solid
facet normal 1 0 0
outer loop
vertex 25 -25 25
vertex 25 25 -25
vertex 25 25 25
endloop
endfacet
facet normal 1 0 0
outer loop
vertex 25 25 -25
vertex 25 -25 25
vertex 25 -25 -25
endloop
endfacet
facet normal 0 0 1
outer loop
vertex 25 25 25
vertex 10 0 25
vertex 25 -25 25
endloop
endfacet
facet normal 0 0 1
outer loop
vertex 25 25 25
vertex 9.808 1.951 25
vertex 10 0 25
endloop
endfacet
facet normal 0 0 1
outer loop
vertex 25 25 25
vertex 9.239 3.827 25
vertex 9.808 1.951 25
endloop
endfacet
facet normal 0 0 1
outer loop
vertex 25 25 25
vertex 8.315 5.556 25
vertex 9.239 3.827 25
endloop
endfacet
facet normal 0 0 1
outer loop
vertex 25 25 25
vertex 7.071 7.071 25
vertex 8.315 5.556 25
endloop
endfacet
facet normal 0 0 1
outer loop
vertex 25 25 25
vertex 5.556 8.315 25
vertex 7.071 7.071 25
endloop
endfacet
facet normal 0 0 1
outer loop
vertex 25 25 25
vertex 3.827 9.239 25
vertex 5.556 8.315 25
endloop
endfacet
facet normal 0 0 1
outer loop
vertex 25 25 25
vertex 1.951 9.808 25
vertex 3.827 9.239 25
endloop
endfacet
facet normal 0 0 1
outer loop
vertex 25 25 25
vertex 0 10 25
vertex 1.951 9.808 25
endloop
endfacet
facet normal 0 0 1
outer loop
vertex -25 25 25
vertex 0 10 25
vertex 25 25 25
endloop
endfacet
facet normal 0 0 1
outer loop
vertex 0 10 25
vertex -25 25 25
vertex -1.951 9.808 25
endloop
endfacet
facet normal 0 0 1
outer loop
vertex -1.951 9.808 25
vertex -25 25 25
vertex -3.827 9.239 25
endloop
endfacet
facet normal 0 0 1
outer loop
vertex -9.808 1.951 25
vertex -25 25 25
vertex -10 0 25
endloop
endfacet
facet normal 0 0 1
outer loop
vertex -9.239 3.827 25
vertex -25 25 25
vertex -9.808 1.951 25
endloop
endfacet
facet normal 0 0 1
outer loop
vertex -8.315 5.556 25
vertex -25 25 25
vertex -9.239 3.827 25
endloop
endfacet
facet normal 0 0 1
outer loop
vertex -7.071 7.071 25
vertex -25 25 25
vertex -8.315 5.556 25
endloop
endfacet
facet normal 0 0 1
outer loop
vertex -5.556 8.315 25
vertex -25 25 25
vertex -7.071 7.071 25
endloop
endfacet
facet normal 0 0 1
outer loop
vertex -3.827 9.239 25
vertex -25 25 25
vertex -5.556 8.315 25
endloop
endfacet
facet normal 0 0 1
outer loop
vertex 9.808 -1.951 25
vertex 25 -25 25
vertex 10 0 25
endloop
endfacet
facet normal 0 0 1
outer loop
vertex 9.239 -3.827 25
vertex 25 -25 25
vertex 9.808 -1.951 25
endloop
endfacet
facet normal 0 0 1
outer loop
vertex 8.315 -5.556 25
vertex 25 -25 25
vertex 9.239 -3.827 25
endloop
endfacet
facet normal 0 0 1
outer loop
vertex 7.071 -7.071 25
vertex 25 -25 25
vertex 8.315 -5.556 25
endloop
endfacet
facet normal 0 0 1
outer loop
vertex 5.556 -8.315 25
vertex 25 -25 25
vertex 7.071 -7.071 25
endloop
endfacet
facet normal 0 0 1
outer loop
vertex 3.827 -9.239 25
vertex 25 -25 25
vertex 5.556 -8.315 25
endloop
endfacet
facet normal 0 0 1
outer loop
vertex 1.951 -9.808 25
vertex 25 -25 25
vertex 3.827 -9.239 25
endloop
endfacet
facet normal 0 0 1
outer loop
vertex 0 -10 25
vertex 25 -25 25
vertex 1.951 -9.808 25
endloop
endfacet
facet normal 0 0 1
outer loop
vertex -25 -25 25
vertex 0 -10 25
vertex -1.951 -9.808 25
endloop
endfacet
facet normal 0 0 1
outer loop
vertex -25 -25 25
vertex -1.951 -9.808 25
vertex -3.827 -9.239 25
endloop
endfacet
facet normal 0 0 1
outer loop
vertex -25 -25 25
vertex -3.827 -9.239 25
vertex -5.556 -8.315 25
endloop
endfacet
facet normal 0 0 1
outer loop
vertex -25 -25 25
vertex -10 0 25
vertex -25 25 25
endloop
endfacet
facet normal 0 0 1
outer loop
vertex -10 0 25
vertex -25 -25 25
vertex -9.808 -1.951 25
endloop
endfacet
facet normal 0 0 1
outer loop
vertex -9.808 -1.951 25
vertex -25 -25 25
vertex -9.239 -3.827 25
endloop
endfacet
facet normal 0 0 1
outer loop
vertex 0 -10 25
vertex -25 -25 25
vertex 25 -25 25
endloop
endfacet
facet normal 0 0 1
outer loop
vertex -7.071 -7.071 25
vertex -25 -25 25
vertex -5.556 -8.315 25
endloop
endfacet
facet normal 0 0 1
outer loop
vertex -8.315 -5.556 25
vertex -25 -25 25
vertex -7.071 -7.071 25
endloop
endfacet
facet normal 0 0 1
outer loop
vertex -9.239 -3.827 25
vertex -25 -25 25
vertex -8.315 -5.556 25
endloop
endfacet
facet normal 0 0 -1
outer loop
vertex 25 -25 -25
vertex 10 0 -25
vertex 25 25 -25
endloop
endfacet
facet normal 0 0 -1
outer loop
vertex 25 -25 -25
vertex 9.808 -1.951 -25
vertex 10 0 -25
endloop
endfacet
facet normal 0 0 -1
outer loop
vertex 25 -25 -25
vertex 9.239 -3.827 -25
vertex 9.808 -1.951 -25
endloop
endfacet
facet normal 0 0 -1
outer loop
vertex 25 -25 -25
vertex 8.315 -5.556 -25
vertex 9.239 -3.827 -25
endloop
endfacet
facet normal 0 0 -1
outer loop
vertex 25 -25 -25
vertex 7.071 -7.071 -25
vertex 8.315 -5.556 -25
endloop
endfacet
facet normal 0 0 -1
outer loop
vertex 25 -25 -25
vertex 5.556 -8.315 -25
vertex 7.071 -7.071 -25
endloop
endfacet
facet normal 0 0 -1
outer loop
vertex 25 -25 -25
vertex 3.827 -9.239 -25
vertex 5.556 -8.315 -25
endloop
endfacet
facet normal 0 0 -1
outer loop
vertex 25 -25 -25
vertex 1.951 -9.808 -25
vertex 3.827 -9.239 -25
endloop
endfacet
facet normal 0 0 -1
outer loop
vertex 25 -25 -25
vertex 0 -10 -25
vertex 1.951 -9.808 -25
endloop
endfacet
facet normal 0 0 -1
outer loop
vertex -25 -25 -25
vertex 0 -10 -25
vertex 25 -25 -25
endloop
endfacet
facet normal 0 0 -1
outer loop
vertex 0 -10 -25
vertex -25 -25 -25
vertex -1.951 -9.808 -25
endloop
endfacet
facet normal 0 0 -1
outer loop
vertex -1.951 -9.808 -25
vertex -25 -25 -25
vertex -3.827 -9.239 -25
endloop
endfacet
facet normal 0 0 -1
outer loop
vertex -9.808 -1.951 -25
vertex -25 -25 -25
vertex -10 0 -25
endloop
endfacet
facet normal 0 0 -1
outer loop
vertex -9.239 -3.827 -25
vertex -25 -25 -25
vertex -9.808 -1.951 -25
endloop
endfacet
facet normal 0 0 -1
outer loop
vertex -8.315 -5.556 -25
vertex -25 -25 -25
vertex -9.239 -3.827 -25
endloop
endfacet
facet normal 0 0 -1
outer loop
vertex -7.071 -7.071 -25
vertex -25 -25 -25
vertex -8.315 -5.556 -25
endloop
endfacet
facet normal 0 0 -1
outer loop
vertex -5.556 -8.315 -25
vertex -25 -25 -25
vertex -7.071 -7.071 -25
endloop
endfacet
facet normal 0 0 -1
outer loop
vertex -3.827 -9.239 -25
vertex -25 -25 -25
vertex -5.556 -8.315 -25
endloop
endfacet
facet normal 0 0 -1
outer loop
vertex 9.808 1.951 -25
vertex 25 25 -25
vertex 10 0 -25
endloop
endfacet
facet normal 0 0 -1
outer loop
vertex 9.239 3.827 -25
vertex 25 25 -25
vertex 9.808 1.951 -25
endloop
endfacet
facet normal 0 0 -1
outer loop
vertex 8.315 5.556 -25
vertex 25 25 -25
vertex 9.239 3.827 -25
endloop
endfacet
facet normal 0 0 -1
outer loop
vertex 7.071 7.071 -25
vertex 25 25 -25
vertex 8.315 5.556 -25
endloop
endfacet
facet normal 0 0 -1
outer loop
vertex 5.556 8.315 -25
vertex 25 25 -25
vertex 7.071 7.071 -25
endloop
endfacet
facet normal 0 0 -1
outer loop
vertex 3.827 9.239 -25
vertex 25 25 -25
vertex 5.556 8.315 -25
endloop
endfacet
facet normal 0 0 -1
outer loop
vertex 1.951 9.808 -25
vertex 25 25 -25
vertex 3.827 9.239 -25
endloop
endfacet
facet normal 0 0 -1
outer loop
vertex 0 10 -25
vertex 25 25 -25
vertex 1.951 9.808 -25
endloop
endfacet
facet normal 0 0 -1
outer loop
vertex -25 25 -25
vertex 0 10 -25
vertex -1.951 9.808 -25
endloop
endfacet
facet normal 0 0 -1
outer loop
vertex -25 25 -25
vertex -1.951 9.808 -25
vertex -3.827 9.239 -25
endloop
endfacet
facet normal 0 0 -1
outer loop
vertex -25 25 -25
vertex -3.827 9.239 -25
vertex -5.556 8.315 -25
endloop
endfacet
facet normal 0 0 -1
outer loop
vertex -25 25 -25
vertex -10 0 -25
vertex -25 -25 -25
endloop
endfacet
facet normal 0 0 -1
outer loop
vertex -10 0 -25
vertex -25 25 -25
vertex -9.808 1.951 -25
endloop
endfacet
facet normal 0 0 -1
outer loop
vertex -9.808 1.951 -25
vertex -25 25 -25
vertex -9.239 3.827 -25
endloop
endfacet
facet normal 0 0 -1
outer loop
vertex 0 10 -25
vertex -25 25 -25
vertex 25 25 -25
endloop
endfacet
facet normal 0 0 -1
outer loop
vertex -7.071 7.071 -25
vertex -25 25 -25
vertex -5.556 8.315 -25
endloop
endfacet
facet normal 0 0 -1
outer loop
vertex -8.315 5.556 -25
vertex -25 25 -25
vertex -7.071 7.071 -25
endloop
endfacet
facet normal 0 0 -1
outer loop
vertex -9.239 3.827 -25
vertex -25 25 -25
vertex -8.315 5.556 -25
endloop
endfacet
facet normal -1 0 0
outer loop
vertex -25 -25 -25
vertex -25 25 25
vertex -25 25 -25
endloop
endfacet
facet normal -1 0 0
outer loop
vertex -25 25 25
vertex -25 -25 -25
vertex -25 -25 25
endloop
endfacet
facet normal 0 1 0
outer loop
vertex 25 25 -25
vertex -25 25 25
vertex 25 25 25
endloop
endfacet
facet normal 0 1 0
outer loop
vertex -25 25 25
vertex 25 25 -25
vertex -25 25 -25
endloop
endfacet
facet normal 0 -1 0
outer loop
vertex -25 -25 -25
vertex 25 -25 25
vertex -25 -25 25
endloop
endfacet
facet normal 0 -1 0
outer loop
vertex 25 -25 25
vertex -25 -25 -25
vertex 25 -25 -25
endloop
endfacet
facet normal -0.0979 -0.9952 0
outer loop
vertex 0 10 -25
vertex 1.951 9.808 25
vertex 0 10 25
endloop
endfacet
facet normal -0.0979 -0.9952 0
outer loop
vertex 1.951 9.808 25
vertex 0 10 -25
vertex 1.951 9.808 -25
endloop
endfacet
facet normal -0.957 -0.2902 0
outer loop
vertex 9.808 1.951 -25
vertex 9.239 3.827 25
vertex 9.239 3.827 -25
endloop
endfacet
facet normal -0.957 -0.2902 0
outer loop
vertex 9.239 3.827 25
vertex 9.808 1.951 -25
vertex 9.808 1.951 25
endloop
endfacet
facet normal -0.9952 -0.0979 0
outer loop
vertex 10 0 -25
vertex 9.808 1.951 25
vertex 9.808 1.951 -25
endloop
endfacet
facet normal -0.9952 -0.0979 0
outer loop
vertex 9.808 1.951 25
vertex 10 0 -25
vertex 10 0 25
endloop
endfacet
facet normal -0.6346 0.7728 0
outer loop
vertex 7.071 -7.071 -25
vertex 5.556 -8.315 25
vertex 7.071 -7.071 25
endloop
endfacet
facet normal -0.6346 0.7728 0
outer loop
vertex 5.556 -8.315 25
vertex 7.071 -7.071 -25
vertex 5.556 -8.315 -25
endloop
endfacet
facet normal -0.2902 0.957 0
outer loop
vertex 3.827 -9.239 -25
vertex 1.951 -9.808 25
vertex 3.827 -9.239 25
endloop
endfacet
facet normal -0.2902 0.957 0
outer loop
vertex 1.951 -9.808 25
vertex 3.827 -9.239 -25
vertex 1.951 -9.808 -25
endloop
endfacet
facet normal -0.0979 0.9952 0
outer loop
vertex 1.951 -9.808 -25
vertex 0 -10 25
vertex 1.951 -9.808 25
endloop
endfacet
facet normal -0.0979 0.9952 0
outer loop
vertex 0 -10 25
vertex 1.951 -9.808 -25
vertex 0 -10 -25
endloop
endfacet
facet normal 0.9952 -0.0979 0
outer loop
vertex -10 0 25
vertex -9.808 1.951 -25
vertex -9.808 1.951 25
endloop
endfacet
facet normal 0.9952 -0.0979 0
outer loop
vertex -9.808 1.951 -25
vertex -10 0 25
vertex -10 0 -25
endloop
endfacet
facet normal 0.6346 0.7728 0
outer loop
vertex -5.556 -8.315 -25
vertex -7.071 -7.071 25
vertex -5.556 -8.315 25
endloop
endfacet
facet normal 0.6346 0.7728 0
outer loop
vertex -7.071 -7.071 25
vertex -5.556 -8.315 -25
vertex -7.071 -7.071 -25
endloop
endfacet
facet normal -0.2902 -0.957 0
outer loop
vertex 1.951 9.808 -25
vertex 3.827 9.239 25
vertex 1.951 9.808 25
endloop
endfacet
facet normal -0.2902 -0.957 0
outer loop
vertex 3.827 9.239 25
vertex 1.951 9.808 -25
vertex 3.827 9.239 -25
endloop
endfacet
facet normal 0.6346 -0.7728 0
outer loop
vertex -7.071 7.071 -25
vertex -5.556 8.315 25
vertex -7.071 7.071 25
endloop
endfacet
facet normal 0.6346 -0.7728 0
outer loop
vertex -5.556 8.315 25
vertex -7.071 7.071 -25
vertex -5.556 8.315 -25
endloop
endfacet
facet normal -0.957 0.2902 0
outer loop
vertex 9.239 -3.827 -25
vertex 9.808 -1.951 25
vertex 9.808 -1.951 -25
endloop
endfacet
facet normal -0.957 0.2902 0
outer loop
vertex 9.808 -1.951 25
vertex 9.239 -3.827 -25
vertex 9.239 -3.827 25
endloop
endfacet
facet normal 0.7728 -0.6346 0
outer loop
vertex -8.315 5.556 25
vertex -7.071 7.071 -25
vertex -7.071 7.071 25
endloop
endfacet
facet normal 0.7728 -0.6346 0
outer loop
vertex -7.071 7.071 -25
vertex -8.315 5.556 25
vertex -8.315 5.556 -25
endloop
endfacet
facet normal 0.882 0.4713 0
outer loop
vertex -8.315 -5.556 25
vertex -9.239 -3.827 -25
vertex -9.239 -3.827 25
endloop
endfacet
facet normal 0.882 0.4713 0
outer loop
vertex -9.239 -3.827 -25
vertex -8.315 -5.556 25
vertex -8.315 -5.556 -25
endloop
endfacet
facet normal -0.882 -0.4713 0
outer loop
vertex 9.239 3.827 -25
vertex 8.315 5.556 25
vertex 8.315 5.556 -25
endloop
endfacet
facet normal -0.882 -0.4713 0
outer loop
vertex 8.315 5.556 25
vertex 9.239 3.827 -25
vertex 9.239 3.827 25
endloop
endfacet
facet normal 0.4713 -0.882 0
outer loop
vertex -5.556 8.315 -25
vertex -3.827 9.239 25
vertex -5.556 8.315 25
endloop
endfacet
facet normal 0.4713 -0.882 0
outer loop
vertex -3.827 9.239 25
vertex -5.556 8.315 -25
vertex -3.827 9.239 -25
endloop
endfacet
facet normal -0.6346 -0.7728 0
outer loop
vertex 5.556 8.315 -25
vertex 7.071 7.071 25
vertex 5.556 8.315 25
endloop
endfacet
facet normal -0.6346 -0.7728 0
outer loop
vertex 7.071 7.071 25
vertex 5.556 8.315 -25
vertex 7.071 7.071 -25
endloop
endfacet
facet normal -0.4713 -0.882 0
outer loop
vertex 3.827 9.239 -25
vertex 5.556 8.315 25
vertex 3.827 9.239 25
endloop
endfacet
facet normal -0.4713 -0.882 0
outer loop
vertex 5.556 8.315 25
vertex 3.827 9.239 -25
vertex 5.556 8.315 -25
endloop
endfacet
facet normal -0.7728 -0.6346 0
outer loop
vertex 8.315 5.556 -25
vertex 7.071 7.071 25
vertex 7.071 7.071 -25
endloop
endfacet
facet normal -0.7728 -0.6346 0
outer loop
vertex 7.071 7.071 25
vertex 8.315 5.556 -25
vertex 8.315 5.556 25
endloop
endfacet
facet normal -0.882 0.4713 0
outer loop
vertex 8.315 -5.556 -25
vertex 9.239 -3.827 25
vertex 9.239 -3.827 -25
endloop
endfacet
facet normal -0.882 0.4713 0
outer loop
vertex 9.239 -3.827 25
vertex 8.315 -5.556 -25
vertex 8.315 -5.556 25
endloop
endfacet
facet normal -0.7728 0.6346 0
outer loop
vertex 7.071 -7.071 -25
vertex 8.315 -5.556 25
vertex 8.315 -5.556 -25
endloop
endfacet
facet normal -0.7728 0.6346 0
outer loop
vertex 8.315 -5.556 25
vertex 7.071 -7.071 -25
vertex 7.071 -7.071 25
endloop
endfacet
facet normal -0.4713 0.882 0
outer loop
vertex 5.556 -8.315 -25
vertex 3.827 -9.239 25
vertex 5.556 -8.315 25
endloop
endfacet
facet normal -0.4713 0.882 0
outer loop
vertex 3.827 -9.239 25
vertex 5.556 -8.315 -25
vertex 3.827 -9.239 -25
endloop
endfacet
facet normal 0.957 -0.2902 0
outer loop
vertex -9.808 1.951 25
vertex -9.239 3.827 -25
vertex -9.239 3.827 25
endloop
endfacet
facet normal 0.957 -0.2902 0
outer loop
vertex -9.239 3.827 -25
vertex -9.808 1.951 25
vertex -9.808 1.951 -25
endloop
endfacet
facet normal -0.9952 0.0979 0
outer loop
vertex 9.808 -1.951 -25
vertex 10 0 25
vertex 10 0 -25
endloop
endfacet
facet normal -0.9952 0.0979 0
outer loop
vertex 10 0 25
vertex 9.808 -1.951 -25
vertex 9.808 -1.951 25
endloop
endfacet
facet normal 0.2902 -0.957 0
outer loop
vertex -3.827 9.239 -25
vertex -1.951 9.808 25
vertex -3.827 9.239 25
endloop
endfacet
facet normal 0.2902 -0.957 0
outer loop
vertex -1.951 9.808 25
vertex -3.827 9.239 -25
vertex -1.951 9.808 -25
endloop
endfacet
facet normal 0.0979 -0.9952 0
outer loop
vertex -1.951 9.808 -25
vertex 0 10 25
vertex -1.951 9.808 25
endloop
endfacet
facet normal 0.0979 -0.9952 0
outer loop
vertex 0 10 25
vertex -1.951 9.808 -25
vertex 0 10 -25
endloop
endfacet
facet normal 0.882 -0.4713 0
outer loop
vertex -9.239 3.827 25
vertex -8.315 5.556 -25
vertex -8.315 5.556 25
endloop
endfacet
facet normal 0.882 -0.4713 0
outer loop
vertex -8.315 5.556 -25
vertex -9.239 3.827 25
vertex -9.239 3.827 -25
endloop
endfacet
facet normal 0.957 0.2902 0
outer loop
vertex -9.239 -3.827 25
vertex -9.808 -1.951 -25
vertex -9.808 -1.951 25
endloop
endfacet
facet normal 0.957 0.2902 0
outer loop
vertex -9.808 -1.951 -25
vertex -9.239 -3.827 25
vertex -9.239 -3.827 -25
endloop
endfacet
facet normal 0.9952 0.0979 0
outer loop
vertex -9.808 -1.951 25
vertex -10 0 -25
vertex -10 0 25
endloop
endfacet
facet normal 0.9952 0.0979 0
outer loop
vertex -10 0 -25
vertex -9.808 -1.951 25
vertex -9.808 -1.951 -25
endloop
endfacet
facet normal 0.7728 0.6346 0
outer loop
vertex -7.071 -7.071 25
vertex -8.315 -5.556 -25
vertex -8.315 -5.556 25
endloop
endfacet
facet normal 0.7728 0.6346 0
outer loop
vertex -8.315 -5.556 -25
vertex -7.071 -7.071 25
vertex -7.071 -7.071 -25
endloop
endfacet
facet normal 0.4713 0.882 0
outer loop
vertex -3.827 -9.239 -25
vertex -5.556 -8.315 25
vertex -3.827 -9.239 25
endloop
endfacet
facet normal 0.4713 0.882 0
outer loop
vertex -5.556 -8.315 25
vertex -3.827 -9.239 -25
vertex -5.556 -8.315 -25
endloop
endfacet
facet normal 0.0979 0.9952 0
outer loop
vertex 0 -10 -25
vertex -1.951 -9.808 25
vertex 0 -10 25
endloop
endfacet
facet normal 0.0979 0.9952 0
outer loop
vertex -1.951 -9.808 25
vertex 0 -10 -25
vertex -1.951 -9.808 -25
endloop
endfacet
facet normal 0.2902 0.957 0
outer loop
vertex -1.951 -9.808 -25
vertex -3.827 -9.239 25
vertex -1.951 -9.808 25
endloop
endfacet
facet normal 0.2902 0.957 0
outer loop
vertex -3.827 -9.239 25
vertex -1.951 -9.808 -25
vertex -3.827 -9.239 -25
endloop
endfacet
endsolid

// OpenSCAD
difference() {
    // 50mm 角の立方体
    cube(50, center = true);
    
    // 直径 20mm の貫通穴（z軸方向）
    cylinder(h = 60, r = 10, center = true, $fn = 32);
}
